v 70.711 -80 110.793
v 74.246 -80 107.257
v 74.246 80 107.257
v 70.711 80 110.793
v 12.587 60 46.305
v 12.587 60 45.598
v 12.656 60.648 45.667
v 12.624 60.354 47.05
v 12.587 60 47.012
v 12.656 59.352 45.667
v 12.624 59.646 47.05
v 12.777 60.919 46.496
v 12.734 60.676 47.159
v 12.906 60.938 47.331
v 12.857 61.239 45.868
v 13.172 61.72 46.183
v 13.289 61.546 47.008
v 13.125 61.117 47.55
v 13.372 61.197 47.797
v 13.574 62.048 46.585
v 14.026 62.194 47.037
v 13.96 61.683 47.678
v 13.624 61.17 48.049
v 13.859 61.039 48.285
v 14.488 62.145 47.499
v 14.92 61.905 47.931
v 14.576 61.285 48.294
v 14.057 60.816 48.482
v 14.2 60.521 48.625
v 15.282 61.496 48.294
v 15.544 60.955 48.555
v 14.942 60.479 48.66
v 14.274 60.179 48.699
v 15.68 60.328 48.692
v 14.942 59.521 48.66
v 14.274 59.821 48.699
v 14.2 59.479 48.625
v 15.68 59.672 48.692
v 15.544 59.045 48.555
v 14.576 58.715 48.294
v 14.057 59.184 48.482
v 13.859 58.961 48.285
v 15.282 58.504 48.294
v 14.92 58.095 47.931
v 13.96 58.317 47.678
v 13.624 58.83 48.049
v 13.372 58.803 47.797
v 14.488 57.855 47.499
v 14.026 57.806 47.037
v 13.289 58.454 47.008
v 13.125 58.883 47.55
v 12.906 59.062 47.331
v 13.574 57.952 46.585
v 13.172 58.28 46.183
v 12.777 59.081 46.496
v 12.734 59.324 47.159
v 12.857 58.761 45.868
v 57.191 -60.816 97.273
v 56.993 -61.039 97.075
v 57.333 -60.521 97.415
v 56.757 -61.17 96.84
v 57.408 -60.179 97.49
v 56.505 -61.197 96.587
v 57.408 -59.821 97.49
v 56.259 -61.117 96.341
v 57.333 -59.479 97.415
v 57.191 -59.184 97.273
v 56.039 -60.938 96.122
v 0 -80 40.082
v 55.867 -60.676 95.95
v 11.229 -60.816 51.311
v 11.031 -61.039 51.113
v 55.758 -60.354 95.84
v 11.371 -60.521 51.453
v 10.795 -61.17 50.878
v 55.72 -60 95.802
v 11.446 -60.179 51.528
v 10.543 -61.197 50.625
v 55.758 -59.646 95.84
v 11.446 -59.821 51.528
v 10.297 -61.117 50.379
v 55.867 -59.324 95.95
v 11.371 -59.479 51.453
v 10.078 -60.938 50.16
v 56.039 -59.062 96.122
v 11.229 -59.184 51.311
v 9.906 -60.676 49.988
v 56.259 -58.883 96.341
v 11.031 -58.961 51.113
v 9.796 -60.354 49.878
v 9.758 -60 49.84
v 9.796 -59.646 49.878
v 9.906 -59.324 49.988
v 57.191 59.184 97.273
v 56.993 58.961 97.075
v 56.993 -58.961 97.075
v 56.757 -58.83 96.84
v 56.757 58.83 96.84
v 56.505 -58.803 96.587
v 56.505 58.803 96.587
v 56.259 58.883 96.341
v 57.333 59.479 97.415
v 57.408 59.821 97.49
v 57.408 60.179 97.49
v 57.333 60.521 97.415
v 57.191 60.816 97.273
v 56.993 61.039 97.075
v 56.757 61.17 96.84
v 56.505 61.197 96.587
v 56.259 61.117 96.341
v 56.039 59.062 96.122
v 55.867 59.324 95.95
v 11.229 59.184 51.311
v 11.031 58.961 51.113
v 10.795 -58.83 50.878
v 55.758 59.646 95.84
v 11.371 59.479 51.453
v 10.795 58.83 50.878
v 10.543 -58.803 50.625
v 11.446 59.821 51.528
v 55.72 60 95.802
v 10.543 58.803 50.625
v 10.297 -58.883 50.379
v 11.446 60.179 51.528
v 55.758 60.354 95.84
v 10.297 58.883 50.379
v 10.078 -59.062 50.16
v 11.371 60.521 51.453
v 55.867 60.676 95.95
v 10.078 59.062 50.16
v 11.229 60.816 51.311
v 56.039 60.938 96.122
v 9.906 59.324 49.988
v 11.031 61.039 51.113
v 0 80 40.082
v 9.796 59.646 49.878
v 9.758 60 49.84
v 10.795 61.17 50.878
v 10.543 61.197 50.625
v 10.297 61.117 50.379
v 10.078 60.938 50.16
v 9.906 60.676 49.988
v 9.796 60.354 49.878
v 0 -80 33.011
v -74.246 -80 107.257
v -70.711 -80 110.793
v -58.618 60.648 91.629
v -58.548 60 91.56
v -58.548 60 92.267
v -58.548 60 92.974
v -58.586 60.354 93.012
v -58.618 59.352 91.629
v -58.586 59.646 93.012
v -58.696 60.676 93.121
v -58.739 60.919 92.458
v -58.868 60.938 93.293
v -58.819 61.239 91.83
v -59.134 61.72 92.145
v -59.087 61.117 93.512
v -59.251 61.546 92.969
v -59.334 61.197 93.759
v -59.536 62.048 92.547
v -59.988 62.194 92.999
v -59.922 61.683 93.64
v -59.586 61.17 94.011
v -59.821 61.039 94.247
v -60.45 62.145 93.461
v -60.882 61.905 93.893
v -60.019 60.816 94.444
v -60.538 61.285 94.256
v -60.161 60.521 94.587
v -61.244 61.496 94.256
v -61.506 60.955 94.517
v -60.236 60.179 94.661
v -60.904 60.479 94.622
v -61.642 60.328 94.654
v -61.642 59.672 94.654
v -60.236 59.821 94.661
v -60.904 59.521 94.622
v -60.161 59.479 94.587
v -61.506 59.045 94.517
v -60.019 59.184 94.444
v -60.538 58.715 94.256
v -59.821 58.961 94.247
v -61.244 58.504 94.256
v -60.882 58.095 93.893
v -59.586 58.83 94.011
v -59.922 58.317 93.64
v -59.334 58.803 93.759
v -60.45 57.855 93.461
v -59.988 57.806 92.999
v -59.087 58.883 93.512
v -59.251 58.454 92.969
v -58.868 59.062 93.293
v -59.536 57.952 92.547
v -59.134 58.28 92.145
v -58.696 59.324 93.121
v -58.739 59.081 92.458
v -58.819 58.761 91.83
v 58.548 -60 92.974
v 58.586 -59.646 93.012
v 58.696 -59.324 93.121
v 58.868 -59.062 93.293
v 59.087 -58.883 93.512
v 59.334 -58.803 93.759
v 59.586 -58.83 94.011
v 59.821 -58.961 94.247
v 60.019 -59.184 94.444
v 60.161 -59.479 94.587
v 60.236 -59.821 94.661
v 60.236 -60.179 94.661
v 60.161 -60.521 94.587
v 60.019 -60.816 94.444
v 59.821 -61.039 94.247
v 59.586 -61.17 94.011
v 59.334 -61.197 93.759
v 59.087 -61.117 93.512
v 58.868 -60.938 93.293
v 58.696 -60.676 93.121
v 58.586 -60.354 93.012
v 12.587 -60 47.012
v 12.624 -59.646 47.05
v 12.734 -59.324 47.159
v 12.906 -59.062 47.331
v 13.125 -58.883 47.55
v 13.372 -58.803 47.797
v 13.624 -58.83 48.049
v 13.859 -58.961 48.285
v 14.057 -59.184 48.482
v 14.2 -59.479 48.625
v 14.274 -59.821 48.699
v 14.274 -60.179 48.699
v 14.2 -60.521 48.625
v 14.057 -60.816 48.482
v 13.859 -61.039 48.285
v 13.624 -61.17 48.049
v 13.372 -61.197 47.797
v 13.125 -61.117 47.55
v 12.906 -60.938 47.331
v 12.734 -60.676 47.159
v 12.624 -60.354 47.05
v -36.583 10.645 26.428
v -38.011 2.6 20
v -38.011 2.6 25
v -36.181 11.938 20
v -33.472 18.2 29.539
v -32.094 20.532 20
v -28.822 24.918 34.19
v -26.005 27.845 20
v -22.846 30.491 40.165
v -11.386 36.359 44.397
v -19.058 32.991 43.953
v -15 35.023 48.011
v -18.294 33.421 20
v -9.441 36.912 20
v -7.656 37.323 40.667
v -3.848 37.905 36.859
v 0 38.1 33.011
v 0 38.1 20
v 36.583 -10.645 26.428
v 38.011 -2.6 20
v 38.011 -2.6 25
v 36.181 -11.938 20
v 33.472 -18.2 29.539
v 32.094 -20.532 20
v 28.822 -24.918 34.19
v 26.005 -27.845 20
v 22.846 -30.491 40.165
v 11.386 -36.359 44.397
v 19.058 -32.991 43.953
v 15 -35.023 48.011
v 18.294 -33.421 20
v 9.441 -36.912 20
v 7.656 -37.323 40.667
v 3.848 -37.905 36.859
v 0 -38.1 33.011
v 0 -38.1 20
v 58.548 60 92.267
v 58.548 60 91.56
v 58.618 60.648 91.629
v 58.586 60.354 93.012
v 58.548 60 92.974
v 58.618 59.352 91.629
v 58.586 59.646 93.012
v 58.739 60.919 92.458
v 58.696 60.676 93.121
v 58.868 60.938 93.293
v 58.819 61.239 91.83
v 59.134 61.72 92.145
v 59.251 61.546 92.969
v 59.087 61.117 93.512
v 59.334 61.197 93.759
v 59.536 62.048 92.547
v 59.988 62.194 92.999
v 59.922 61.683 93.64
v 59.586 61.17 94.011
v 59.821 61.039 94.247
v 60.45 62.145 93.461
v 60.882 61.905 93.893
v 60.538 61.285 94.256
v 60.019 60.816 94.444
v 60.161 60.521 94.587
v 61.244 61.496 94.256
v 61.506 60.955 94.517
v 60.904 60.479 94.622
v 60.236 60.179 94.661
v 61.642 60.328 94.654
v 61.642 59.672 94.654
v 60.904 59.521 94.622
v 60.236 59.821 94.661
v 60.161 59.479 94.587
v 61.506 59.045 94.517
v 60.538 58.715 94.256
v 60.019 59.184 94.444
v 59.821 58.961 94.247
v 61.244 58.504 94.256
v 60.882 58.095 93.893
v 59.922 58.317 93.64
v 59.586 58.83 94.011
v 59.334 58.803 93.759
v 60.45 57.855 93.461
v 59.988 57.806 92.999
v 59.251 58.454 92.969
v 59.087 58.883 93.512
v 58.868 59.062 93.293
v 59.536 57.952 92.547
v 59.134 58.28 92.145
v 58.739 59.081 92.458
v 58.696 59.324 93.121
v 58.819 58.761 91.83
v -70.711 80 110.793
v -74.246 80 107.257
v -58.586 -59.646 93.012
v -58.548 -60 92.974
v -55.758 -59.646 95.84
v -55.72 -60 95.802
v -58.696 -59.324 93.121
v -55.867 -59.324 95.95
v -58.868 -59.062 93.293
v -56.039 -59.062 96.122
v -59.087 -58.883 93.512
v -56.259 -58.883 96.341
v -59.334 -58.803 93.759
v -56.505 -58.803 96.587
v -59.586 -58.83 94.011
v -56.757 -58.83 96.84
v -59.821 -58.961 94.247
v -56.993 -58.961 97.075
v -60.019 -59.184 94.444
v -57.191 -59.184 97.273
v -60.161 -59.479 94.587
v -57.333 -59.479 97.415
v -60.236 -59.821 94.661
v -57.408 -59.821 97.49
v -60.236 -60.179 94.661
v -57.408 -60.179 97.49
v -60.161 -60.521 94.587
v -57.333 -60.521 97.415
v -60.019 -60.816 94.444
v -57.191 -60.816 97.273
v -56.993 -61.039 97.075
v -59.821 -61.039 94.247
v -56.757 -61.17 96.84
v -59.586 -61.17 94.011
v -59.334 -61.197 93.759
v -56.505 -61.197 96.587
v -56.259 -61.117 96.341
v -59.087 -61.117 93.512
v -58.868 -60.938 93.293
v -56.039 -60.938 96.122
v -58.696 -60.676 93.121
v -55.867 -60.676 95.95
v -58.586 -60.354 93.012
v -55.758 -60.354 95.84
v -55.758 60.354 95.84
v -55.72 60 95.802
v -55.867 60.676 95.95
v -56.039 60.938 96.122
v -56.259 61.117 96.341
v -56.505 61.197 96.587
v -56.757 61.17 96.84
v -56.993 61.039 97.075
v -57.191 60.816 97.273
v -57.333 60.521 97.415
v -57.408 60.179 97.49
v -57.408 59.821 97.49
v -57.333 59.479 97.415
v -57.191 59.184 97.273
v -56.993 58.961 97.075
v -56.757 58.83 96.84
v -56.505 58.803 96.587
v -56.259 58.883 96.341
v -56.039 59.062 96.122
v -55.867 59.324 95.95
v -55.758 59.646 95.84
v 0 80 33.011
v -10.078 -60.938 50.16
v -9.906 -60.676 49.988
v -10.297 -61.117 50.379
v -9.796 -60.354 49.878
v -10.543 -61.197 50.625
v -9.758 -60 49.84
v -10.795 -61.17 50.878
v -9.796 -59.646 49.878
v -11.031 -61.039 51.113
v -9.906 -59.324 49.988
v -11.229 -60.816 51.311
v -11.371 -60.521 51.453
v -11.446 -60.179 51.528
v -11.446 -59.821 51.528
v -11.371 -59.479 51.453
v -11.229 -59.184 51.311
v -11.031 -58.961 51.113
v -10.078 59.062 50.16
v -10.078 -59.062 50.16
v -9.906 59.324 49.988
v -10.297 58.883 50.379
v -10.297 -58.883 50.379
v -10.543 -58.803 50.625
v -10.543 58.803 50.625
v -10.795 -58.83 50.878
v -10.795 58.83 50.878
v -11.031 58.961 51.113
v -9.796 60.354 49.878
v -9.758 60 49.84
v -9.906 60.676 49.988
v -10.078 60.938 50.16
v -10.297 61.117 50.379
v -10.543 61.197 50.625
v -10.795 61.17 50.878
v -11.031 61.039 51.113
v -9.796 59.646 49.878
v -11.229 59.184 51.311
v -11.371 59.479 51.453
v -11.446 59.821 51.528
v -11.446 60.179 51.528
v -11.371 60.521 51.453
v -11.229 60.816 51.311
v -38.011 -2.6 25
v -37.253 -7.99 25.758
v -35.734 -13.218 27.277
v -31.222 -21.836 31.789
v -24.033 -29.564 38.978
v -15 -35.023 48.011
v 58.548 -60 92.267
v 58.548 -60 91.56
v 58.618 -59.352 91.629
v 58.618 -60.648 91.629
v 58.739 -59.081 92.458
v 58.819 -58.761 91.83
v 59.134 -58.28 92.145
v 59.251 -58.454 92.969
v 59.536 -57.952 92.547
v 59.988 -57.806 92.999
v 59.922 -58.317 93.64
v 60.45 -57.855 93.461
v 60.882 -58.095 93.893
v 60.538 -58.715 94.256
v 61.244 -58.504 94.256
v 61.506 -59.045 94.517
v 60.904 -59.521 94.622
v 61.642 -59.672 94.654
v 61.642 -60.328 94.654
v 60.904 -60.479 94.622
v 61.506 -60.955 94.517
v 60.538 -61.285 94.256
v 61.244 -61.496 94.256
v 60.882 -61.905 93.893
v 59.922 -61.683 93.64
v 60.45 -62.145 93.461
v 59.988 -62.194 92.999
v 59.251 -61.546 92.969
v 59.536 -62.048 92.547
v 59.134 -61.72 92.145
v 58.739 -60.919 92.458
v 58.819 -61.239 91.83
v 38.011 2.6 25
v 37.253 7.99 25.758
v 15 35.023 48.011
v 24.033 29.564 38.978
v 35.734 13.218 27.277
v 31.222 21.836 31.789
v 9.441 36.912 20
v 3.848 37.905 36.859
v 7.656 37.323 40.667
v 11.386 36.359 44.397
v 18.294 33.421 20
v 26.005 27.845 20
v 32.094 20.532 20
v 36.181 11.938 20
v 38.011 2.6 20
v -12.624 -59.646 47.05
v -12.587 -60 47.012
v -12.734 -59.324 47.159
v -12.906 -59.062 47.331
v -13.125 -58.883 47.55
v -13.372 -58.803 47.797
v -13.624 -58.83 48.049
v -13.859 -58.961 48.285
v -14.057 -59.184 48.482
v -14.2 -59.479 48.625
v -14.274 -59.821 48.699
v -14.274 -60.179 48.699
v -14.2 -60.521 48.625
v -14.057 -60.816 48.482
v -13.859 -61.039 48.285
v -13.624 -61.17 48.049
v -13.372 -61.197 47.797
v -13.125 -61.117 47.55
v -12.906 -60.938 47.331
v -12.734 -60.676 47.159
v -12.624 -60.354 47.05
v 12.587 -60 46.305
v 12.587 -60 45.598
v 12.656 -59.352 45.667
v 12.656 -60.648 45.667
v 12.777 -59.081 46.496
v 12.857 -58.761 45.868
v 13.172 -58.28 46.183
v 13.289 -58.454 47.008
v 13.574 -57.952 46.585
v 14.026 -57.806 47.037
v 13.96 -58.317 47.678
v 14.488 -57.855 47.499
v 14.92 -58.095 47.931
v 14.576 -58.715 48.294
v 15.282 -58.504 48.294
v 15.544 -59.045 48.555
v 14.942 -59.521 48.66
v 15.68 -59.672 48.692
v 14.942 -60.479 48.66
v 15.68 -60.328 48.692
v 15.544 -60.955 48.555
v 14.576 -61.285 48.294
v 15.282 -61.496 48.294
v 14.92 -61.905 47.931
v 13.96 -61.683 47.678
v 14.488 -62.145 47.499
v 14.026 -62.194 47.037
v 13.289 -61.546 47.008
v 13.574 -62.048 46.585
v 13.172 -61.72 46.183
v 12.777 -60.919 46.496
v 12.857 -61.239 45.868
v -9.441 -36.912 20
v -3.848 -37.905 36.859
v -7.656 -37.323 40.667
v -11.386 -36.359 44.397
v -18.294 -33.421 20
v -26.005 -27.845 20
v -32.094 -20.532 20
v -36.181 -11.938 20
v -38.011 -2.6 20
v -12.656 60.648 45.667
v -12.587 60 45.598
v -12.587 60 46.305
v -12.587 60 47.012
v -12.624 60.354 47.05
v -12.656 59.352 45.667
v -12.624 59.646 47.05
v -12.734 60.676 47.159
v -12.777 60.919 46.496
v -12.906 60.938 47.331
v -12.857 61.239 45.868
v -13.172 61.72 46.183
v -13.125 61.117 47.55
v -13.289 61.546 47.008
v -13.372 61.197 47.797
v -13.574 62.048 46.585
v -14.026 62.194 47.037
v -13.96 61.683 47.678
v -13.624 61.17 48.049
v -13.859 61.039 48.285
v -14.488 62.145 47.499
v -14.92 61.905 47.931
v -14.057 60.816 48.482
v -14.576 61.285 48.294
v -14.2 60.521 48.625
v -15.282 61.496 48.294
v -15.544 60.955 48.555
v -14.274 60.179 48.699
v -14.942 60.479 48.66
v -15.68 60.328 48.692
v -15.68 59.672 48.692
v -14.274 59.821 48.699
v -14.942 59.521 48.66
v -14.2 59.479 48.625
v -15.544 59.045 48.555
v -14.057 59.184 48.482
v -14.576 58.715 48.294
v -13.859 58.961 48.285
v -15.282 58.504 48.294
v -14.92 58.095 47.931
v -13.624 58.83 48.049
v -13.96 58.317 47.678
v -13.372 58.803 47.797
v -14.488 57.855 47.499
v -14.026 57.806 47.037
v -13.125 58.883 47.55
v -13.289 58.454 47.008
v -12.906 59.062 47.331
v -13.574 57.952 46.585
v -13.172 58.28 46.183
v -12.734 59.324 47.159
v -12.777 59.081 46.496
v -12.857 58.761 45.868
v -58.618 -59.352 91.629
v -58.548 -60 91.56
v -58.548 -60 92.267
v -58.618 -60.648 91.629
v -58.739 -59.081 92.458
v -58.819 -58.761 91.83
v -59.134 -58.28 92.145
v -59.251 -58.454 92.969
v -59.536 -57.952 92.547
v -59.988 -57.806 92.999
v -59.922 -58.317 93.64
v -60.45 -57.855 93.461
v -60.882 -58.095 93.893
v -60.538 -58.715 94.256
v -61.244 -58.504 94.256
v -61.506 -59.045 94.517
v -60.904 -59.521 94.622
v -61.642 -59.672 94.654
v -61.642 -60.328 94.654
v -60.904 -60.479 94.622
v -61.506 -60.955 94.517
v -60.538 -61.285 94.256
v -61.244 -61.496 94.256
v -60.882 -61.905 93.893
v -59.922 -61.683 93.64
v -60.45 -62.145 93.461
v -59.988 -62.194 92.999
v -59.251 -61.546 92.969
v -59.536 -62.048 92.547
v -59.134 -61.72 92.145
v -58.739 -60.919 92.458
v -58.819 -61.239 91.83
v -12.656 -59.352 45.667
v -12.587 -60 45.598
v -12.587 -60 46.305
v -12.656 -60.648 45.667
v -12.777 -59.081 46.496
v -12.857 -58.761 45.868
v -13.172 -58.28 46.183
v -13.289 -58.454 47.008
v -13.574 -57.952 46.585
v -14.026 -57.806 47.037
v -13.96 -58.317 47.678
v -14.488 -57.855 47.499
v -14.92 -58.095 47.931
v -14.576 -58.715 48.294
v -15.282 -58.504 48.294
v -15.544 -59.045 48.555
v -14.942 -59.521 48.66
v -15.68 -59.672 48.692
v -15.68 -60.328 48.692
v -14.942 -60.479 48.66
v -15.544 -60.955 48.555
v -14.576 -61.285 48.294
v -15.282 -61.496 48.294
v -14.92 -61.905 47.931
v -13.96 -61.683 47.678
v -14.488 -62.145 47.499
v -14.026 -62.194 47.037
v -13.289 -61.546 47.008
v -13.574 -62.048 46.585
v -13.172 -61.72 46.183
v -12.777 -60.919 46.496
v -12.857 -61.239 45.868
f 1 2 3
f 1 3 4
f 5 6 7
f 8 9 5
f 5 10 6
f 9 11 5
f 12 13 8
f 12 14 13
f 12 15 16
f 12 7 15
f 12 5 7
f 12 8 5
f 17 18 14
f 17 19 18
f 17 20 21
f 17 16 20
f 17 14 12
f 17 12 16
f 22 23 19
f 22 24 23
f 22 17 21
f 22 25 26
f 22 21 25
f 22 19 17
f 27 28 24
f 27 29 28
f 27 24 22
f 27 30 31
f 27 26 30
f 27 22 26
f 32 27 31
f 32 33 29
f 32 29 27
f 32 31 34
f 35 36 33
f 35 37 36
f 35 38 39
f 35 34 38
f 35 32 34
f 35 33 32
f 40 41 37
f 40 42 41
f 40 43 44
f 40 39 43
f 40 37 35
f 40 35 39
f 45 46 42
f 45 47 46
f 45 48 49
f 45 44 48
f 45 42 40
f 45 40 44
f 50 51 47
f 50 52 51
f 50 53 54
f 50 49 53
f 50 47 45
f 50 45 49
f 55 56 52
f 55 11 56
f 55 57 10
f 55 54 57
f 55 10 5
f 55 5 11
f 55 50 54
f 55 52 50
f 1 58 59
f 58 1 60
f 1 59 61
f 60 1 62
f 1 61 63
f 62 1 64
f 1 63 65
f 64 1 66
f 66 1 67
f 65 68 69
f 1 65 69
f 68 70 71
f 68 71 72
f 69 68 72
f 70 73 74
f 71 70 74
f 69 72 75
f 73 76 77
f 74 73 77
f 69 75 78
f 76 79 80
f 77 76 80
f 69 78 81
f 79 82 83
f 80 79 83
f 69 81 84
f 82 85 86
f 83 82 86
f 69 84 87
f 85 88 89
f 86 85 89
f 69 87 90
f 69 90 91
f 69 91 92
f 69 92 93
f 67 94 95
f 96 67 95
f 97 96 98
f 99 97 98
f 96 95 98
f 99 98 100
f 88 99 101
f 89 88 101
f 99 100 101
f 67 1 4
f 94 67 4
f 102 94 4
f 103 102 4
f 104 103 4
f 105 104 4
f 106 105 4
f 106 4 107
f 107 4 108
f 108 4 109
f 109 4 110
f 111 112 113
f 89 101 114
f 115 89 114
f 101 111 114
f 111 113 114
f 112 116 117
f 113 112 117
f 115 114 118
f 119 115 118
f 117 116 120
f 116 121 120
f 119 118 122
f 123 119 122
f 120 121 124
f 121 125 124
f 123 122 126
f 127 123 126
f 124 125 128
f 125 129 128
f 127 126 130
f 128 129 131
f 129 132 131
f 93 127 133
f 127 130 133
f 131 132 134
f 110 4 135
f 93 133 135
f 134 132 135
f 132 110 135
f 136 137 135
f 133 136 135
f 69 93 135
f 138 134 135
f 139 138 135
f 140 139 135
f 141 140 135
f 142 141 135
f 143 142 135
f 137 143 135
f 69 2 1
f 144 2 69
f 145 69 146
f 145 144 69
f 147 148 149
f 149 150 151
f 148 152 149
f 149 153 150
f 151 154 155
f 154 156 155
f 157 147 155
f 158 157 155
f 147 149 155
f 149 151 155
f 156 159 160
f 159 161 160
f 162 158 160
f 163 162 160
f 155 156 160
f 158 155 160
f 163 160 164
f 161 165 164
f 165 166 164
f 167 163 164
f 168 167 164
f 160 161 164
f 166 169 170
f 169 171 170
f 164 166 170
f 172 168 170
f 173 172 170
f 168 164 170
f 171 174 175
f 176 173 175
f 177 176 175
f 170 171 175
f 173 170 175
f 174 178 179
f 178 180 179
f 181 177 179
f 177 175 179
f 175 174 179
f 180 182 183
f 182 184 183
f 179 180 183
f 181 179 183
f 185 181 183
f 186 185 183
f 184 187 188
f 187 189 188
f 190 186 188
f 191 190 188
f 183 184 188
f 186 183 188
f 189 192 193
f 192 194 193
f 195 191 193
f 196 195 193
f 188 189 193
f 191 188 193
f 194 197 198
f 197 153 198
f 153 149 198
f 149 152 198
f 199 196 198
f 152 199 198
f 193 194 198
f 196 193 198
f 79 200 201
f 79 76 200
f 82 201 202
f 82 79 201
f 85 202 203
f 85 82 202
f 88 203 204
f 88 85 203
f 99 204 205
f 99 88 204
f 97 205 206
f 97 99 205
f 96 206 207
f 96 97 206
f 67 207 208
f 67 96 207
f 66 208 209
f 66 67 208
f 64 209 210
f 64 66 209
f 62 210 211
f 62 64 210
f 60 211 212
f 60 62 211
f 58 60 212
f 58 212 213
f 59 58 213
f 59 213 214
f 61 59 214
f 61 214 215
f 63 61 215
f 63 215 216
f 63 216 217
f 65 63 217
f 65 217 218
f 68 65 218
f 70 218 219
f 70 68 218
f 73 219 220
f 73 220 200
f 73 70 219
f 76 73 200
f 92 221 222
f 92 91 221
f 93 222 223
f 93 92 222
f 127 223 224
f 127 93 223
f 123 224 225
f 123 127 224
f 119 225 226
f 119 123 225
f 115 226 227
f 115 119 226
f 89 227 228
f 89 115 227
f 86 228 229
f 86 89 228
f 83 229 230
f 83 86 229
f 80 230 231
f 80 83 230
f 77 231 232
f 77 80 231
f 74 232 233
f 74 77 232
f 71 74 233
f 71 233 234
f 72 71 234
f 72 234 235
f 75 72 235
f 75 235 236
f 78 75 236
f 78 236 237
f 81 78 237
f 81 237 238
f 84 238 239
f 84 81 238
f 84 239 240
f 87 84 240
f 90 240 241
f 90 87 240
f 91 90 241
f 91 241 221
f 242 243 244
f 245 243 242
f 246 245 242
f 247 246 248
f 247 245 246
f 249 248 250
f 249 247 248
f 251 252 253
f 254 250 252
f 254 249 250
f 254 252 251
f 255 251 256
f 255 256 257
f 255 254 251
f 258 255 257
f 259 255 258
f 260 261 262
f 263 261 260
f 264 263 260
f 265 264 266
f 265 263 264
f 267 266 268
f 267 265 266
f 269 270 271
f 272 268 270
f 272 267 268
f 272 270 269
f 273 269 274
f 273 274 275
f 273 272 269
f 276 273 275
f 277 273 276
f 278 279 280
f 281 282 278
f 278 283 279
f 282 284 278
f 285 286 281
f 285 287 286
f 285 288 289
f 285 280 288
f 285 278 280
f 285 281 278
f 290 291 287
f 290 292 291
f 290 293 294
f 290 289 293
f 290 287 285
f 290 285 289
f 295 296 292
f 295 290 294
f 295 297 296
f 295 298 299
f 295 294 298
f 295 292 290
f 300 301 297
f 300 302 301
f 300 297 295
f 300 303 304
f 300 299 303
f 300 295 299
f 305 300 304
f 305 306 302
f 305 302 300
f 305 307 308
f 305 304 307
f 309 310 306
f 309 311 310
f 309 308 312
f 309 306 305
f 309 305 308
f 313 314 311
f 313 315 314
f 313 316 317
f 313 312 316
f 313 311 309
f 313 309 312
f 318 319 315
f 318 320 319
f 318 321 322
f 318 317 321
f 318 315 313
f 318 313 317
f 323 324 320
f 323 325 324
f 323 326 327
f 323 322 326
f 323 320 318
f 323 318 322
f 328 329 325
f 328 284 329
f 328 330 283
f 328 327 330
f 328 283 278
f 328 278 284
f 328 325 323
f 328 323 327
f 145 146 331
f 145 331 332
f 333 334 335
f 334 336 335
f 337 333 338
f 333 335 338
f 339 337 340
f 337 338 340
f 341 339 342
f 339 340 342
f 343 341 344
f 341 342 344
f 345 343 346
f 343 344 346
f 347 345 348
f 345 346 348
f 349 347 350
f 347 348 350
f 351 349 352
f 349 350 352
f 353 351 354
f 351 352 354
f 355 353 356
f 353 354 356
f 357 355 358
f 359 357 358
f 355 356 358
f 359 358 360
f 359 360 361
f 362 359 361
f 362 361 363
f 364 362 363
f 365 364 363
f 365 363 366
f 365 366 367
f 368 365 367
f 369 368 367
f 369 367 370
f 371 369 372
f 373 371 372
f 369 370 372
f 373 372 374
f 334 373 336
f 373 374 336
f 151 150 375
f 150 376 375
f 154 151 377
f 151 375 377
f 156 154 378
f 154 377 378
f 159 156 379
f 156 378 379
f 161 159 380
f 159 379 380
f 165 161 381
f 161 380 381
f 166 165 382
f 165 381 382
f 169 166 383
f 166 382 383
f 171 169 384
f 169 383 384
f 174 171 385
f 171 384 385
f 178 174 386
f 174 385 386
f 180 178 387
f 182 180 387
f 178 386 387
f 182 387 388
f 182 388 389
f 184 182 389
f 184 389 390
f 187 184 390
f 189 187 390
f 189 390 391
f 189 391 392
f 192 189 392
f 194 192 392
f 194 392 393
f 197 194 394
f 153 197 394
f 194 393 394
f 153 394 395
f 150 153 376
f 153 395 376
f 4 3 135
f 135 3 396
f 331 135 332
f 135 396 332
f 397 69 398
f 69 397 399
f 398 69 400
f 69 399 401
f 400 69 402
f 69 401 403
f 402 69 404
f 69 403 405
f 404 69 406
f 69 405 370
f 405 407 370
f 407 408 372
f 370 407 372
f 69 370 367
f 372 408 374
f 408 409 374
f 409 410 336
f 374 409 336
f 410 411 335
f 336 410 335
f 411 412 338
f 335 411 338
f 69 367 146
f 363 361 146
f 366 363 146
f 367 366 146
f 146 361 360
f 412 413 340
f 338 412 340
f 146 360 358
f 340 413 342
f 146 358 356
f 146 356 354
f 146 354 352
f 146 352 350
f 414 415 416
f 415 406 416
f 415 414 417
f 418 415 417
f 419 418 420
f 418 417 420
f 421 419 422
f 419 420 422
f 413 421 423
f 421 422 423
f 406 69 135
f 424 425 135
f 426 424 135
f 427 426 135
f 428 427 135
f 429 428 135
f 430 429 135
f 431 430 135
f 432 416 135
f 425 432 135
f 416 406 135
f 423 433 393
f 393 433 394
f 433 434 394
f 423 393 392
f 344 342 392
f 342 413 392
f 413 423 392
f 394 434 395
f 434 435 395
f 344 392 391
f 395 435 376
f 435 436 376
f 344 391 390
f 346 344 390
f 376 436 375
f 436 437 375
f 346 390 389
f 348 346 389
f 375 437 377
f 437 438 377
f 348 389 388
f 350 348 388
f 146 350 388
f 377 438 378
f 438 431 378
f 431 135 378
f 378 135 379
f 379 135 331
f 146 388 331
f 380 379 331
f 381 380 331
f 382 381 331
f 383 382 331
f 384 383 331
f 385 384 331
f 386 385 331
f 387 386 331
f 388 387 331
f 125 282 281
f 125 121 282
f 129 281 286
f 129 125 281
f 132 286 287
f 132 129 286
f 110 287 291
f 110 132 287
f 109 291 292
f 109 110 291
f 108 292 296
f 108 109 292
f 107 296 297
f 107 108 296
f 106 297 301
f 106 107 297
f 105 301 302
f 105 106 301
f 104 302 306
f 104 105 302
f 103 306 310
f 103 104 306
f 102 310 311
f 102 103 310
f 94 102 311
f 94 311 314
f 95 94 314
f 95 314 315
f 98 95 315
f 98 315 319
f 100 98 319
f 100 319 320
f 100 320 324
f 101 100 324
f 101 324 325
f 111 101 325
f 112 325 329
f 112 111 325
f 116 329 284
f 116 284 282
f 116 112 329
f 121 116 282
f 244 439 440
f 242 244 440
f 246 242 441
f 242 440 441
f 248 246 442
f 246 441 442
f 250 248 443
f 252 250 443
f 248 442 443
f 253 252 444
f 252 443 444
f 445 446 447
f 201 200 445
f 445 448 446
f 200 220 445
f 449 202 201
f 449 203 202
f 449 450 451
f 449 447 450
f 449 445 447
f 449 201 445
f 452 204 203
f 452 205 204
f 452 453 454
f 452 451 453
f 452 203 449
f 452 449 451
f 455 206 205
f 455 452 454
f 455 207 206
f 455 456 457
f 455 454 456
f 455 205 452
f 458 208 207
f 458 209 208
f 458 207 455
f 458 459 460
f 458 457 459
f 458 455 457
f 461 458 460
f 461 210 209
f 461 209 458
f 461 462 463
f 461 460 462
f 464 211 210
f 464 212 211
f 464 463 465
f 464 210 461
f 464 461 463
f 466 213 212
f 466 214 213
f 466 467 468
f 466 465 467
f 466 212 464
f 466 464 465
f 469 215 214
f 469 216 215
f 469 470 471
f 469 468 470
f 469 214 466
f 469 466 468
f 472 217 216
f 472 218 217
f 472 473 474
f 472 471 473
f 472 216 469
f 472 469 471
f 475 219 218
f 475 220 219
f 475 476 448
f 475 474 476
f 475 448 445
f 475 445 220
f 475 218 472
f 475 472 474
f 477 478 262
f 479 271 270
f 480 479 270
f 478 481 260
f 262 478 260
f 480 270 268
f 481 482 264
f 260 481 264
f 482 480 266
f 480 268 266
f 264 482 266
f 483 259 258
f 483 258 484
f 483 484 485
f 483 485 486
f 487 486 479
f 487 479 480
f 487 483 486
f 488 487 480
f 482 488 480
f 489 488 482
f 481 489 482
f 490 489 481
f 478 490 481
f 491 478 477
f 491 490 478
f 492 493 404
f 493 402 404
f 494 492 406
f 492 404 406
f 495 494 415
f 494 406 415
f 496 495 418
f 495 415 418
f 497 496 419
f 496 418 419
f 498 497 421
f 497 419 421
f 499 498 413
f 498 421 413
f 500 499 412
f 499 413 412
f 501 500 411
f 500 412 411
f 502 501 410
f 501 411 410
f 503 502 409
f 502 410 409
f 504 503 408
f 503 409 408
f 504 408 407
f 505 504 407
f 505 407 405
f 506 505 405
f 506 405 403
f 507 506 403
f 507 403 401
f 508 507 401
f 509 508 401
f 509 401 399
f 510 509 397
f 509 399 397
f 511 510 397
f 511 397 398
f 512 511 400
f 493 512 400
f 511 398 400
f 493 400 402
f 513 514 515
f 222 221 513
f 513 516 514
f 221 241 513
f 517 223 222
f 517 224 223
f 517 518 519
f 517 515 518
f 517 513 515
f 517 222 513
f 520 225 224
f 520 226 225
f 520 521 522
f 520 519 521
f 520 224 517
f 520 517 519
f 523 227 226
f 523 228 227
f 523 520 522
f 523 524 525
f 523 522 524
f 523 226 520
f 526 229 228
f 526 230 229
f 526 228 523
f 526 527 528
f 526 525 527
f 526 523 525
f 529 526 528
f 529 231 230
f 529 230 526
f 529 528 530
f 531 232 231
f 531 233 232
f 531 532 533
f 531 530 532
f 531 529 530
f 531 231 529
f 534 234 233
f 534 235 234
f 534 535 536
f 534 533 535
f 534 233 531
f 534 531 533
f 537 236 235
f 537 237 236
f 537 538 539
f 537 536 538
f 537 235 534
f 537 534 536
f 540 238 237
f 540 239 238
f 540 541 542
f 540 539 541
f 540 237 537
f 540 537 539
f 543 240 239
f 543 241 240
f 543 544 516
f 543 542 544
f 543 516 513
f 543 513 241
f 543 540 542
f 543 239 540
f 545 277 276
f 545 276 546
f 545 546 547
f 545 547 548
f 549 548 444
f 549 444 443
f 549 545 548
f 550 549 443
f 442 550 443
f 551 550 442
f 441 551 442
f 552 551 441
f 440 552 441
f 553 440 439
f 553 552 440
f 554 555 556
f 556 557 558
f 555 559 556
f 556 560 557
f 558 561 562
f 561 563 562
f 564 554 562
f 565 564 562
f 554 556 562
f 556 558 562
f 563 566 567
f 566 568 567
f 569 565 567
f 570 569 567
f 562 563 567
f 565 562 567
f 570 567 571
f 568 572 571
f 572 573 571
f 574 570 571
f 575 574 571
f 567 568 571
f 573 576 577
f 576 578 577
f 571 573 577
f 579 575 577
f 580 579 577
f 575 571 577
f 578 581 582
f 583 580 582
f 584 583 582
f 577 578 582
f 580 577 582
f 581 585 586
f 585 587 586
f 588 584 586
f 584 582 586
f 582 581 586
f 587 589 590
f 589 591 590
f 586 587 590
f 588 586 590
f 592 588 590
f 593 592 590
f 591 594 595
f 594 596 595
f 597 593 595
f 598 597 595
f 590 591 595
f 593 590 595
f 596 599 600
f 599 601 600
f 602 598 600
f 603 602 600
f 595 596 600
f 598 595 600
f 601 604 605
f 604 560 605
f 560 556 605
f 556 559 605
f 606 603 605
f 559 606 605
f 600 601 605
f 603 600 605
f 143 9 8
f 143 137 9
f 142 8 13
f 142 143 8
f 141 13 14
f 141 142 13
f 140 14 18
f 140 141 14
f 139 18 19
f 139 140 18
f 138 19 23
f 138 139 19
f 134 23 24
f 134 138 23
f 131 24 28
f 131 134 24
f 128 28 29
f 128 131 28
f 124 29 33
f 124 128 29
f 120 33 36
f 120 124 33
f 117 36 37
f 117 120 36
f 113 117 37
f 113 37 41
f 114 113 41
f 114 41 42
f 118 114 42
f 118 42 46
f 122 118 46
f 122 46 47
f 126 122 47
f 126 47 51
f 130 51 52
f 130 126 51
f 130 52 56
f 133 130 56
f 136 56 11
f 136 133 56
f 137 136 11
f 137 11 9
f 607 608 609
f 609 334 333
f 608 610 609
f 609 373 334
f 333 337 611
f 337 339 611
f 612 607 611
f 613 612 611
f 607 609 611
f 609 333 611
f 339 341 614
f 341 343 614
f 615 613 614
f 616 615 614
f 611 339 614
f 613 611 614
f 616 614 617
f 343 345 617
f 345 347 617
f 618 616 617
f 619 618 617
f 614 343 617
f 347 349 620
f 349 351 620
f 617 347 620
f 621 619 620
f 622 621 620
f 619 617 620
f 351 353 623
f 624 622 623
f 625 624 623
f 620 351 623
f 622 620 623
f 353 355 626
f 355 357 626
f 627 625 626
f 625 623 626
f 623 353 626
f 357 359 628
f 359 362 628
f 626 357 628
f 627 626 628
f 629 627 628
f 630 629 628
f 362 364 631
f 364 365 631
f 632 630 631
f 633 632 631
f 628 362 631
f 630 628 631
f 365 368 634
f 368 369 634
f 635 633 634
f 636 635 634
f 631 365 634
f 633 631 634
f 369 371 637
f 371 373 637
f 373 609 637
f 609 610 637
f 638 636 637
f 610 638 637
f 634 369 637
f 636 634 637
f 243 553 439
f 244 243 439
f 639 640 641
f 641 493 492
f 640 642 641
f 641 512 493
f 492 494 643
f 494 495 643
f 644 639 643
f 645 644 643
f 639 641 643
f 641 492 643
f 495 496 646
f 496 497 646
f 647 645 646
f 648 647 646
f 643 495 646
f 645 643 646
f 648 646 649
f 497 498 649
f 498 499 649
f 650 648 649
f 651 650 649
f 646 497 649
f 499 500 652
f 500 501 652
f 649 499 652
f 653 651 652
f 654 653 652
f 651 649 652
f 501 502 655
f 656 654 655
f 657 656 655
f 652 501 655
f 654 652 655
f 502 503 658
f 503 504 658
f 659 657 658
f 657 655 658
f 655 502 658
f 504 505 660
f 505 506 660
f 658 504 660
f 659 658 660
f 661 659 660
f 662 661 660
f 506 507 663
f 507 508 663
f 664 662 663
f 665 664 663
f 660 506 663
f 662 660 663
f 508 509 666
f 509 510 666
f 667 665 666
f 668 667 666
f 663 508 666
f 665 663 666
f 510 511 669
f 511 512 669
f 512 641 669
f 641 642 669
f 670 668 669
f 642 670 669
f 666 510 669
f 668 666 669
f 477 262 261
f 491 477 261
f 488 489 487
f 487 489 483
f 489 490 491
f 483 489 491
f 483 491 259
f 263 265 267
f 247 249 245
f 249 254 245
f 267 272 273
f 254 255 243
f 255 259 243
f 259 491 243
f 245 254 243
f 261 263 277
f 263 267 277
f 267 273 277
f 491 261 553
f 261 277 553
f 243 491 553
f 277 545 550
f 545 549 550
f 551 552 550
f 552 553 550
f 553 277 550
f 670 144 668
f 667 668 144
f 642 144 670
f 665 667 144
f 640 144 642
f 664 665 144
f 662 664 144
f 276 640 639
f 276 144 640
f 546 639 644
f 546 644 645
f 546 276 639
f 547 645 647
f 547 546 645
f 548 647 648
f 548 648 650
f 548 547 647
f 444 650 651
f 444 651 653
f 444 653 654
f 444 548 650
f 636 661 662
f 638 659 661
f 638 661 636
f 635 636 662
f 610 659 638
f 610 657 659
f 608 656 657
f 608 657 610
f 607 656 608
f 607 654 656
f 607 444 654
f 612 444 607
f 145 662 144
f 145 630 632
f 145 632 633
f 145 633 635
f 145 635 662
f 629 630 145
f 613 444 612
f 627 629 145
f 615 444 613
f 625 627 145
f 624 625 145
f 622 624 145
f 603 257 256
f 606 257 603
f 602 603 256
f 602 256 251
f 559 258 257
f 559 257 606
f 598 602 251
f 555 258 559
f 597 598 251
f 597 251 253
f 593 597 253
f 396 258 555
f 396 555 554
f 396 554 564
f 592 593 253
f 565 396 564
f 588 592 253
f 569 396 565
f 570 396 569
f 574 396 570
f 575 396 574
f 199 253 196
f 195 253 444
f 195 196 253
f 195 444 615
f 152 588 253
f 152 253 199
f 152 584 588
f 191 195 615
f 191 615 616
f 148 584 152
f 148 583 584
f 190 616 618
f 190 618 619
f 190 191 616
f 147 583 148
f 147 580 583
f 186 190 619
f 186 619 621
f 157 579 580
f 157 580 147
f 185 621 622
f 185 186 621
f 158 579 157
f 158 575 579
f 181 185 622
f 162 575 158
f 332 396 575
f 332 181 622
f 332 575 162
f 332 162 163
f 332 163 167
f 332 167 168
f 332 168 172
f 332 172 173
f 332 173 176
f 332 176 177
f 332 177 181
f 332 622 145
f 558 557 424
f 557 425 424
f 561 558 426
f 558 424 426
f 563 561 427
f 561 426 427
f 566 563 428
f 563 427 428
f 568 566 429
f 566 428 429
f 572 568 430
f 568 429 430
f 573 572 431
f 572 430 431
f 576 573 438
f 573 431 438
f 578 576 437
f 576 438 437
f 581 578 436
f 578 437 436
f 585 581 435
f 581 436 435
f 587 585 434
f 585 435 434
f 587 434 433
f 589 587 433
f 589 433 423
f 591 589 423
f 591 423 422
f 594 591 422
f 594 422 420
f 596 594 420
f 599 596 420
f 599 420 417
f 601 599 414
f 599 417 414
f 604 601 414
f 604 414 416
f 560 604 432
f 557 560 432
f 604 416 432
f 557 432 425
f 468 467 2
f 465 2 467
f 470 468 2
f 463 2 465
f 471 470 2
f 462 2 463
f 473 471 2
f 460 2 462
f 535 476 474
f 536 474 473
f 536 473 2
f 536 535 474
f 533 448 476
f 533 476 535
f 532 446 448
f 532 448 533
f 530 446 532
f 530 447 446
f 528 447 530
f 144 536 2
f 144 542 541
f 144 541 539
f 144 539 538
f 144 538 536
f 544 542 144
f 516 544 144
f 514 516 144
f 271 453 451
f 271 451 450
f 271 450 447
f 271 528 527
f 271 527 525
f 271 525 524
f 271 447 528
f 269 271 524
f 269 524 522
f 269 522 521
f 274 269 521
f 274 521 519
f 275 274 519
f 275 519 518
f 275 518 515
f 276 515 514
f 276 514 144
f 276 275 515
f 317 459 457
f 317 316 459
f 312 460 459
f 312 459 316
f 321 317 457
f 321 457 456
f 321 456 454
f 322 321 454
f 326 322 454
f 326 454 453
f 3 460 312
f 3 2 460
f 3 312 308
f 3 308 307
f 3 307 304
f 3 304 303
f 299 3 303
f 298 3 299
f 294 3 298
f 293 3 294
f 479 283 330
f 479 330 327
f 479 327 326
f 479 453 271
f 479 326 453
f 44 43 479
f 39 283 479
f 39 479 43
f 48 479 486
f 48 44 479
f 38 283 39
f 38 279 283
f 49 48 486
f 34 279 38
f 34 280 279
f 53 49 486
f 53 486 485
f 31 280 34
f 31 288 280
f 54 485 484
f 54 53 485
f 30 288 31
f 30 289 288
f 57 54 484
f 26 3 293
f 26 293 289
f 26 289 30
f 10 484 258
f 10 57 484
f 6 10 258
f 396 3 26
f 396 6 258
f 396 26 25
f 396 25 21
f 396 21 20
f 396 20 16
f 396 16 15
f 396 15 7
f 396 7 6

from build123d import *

# Parameters (mm, degrees)
BOSS_EXTRUDE1_START                             = -38.1
BOSS_EXTRUDE1_DEPTH                             = 76.2
BOSS_EXTRUDE1_START_2                           = 20
BOSS_EXTRUDE1_2_DEPTH                           = 29
BOSS_EXTRUDE2_DEPTH                             = 80
CSK_FOR_M2_FLAT_HEAD_MACHINE_SCREW1_D           = 2.4
CSK_FOR_M2_FLAT_HEAD_MACHINE_SCREW1_CSINK_D     = 4.4
CSK_FOR_M2_FLAT_HEAD_MACHINE_SCREW1_CSINK_ANGLE = 90


with BuildPart() as part:
    # Boss-Extrude1: read off the stored shape, not the designer's step
    # Boss-Extrude1 outline → Boss-Extrude1 (new body)
    with BuildSketch(Plane(origin=(0, 0, 0), x_dir=(1, 0, 0), z_dir=(0, 1, 0)).offset(BOSS_EXTRUDE1_START)):
        Polygon((-15, -48.011182565), (0, -33.011182565), (15, -48.011182565), (38.011182565, -25), (38.011182565, -20), (-38.011182565, -20), (-38.011182565, -25), align=None)
    extrude(amount=BOSS_EXTRUDE1_DEPTH)

    # Boss-Extrude1 2 outline → Boss-Extrude1 2 (cut)
    with BuildSketch(Plane.XY.offset(BOSS_EXTRUDE1_START_2)):
        with BuildLine():
            ThreePointArc((0, 38.1), (26.005287924, 27.844837942), (38.011182565, 2.6))
            Line((38.011182565, 2.6), (38.011182565, 38.1))
            Line((38.011182565, 38.1), (0, 38.1))
        make_face()
        with BuildLine():
            ThreePointArc((-38.011182565, 2.6), (-26.005287924, 27.844837942), (0, 38.1))
            Line((0, 38.1), (-38.011182565, 38.1))
            Line((-38.011182565, 38.1), (-38.011182565, 2.6))
        make_face()
        with BuildLine():
            Line((38.011182565, -38.1), (38.011182565, -2.6))
            ThreePointArc((38.011182565, -2.6), (26.005287924, -27.844837942), (0, -38.1))
            Line((0, -38.1), (38.011182565, -38.1))
        make_face()
        with BuildLine():
            Line((-38.011182565, -38.1), (0, -38.1))
            ThreePointArc((0, -38.1), (-26.005287924, -27.844837942), (-38.011182565, -2.6))
            Line((-38.011182565, -2.6), (-38.011182565, -38.1))
        make_face()
    extrude(amount=BOSS_EXTRUDE1_2_DEPTH, mode=Mode.SUBTRACT)

    # Sketch1<3> → Boss-Extrude2 (add, symmetric)
    with BuildSketch(Plane(origin=(0, 0, 0), x_dir=(1, 0, 0), z_dir=(0, 1, 0))):
        Polygon((0, -33.011182565), (15, -48.011182565), (74.246212025, -107.25739459), (70.710678119, -110.792928496), (0, -40.082250377), (-70.710678119, -110.792928496), (-74.246212025, -107.25739459), (-15, -48.011182565), align=None)
    extrude(amount=BOSS_EXTRUDE2_DEPTH, both=True)

    # CSK for M2 Flat Head Machine Screw1 (through all)
    with Locations(Plane(origin=(16.505591283, 0, 16.505591283), x_dir=(-0.7071067811865441, 0, 0.7071067811865509), z_dir=(-0.7071067811865509, 0, -0.7071067811865441))):
        with Locations((108.342431047, 60), (43.342431047, 60), (43.342431047, -60), (108.342431047, -60)):
            csk_for_m2_flat_head_machine_screw1 = CounterSinkHole(CSK_FOR_M2_FLAT_HEAD_MACHINE_SCREW1_D / 2, CSK_FOR_M2_FLAT_HEAD_MACHINE_SCREW1_CSINK_D / 2, counter_sink_angle=CSK_FOR_M2_FLAT_HEAD_MACHINE_SCREW1_CSINK_ANGLE)

    # Mirror1: CSK for M2 Flat Head Machine Screw1 across plane
    add(csk_for_m2_flat_head_machine_screw1.mirror(Plane(origin=(0, 0, 0), x_dir=(0, 0, 1), z_dir=(1, 0, 0))), mode=Mode.SUBTRACT)


solid = part.part
